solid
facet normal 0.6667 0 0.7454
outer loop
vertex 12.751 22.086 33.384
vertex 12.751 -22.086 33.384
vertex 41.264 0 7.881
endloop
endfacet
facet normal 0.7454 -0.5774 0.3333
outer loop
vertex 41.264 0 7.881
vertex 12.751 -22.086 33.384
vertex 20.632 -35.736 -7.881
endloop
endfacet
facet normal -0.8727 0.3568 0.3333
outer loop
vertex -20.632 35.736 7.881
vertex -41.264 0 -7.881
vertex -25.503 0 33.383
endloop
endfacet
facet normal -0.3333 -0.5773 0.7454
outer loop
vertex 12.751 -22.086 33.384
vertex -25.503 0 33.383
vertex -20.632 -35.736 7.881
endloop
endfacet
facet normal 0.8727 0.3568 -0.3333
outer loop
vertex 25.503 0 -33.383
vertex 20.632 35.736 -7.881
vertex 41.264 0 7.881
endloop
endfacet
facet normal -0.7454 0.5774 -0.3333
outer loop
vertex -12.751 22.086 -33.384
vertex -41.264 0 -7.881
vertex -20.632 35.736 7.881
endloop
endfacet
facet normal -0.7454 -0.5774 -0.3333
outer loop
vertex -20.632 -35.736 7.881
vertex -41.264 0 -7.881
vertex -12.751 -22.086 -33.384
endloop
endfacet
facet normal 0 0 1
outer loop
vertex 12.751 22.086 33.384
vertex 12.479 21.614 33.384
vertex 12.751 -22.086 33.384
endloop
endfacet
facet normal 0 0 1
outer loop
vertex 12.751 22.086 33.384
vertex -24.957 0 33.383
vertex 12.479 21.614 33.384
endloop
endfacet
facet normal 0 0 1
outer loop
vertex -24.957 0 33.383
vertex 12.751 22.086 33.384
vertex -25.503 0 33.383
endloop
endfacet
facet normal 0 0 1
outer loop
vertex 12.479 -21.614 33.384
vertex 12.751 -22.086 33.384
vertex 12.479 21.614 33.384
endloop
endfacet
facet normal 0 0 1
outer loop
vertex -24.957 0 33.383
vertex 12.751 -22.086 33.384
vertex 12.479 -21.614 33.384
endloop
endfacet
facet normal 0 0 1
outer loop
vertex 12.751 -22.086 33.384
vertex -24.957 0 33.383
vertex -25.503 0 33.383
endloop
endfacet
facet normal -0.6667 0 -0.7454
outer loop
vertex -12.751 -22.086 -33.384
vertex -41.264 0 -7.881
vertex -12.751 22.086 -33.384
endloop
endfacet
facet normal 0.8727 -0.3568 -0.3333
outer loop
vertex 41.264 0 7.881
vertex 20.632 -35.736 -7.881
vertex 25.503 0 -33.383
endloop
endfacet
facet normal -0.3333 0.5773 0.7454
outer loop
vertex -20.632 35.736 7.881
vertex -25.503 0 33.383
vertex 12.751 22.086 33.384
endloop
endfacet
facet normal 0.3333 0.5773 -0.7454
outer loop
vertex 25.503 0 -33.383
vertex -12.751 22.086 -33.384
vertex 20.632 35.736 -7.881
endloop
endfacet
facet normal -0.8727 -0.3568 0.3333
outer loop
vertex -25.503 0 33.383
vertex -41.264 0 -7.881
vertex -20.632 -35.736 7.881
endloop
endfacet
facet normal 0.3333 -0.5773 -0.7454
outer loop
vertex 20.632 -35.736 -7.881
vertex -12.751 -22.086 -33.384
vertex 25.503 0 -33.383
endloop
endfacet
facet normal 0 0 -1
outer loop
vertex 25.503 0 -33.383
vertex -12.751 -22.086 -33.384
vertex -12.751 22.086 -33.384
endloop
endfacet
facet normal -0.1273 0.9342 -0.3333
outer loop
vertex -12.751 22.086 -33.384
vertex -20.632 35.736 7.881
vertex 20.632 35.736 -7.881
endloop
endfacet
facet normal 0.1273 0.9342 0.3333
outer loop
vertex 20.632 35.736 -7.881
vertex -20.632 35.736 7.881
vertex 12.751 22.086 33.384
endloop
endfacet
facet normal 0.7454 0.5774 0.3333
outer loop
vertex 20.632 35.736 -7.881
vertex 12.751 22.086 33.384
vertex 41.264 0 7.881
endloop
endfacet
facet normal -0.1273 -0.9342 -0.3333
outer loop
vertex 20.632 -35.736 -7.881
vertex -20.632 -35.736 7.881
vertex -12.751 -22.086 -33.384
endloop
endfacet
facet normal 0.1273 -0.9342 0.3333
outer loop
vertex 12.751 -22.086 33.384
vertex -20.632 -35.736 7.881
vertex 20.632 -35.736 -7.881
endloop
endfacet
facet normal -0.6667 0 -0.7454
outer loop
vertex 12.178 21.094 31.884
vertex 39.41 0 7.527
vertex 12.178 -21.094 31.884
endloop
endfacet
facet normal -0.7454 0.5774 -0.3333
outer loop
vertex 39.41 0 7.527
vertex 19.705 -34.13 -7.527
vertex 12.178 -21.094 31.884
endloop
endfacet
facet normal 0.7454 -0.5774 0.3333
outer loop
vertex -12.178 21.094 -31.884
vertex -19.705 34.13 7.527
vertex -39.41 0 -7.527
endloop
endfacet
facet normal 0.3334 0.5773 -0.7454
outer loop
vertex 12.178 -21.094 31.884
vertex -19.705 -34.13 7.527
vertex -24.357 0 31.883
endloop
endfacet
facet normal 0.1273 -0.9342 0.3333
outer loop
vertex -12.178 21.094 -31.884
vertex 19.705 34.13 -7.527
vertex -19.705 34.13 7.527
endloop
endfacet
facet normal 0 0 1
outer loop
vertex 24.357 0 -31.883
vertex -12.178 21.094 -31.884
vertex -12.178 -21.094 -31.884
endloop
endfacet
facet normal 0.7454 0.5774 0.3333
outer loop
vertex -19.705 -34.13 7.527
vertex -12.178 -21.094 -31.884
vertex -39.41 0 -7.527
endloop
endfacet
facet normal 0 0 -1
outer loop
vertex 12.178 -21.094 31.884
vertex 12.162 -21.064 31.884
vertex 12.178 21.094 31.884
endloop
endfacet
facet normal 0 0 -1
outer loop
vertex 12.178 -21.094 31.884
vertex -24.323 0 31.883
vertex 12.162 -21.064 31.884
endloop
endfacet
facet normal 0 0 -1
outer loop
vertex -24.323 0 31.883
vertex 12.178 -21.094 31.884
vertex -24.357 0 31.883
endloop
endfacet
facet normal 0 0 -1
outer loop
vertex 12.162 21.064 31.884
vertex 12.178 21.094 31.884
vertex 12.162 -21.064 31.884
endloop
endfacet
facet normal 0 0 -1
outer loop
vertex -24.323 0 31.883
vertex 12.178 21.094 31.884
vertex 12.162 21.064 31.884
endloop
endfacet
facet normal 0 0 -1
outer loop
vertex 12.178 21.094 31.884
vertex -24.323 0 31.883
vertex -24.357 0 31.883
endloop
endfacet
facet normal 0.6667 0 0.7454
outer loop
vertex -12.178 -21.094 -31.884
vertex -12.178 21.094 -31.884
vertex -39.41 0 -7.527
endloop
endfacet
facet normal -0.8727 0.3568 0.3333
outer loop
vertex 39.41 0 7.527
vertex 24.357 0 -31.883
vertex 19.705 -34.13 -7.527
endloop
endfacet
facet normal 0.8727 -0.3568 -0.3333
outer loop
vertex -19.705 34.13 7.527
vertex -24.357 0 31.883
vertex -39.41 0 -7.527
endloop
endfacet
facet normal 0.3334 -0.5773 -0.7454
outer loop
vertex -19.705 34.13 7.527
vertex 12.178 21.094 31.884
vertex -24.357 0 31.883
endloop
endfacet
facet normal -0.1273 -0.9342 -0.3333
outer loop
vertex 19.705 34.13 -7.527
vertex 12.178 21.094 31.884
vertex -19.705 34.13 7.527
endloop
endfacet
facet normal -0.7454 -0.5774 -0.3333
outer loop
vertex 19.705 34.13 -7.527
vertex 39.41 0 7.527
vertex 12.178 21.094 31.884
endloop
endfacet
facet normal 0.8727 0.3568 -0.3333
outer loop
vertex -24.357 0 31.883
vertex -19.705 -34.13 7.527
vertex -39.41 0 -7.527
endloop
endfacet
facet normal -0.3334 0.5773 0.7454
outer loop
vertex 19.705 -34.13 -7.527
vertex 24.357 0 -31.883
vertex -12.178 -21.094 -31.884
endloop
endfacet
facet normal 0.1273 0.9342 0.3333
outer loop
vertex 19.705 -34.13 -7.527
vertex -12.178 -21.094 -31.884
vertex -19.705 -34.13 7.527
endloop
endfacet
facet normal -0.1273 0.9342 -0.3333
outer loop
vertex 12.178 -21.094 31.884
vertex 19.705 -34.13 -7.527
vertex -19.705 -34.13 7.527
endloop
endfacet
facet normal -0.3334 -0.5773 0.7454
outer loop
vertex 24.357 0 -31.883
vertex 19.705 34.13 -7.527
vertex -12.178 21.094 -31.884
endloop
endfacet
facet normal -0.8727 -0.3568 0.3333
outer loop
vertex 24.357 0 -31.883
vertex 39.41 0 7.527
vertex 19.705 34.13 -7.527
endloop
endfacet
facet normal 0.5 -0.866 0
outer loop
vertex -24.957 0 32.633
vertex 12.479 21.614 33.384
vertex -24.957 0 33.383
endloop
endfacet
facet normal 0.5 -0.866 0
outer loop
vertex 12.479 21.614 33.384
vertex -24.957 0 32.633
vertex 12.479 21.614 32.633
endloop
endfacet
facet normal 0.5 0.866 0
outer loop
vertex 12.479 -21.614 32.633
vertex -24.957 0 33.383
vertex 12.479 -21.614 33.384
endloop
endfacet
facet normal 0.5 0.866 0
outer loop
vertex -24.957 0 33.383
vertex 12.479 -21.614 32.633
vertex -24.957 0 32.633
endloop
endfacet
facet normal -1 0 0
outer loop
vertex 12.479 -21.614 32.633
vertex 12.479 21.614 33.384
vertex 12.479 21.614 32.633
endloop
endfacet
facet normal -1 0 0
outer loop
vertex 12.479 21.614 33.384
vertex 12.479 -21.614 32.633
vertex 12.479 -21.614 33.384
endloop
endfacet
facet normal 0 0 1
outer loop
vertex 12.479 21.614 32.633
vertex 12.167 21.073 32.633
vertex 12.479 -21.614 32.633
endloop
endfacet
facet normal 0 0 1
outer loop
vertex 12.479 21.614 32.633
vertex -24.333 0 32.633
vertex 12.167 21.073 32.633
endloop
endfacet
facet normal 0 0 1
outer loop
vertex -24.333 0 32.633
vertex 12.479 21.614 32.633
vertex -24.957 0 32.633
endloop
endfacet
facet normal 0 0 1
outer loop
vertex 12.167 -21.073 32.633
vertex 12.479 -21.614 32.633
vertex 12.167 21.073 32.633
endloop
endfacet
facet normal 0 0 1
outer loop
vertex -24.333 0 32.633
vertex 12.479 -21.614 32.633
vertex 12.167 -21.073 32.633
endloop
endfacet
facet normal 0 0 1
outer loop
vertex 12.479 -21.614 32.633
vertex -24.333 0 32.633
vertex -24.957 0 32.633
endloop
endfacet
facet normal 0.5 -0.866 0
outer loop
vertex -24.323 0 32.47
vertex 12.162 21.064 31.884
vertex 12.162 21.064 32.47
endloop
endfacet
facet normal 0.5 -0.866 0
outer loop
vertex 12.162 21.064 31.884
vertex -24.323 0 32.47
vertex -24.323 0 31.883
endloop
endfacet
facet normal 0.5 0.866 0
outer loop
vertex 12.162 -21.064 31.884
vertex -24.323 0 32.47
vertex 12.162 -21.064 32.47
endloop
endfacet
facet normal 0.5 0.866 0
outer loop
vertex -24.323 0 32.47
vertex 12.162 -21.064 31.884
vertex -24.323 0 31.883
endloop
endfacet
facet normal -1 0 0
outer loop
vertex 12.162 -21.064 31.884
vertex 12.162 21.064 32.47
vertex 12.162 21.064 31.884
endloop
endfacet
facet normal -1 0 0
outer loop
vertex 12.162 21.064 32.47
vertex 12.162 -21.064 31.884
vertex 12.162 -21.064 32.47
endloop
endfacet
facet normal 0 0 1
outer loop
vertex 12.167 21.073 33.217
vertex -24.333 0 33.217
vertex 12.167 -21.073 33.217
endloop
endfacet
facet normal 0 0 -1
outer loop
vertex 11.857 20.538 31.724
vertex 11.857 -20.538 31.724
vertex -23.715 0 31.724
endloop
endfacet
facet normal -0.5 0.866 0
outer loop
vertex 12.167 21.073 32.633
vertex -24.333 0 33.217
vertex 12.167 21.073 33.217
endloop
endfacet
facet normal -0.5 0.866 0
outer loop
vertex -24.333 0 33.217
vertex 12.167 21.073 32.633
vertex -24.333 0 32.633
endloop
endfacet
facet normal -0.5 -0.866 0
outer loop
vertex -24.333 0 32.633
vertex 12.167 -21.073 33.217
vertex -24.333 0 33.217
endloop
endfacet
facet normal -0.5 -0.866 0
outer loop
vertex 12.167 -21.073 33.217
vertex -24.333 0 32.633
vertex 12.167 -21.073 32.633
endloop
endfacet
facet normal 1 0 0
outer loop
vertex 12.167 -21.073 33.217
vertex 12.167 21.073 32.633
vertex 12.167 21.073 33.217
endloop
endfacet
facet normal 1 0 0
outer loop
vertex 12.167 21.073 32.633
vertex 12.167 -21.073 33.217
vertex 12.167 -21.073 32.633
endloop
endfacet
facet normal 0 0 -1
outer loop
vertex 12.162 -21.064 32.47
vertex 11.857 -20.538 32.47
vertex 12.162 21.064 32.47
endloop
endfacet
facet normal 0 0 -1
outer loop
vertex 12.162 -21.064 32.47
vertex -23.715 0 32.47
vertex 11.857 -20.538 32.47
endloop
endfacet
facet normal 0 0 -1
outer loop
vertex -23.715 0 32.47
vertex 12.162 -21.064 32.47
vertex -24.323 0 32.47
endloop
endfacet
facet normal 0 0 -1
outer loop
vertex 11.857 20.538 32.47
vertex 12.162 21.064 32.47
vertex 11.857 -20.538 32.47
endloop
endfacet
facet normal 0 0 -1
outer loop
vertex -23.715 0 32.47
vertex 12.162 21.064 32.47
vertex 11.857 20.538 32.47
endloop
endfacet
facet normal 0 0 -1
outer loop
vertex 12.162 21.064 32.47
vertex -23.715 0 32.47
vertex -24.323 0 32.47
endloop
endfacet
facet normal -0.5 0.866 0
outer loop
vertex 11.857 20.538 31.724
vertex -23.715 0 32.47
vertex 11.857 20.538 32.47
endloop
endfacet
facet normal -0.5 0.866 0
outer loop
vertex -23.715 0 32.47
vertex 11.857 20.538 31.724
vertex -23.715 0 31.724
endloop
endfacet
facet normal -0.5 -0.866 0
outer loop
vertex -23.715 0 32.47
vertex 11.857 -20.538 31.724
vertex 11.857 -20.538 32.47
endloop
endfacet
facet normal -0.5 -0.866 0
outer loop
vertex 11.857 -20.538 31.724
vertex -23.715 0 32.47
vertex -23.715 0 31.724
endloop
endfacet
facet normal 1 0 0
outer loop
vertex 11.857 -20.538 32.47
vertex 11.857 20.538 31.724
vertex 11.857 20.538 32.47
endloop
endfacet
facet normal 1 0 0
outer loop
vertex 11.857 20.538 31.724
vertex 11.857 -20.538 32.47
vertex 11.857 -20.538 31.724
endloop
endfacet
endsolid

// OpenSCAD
arete = 44.172;
angle = 20.905;
paroi = 1.5;
echelleReductionAjustementBouchon = 0.975;
r = 0.19; // résolution d'impression sur l'axe Z
ico_sch = [3,5];
Cpi = 3.14159;
Cphi = (1+sqrt(5))/2;
Cepsilon = 0.00000001;

function ico_ext_radius(a) = 
    a*1/4*(sqrt(10+2*sqrt(5)));
    
function ico_int_radius(a) = 
    a/12*(3*sqrt(3)+sqrt(15));
    
function ico_arete_from(int_radius) = 
    int_radius*12/(3*sqrt(3)+sqrt(15));
    
externalRadius = ico_ext_radius(arete);
internalRadius = ico_ext_radius( 
                    ico_arete_from(
                        ico_int_radius(arete)-paroi));
                        
echo(externalRadius); 
echo(internalRadius);

//ico_creux();
//decoupe_bouchon();
corps_ouvert();
bouchon();
//trou();

module corps_ouvert() {
    //rotate([180, 0, 0])
	difference() {
		ico_creux();
		decoupe_bouchon();
	}
}

module bouchon(version) {
//    rotate([180, 0, 0])
	scale([echelleReductionAjustementBouchon, echelleReductionAjustementBouchon, 0.995])
	difference () {
        intersection() {
            ico_creux();
            decoupe_bouchon(echelleReductionAjustementBouchon);
        }
        // trou centre face
//		translate([0, 0, externalRadius*0.5])
//		cylinder(30, r=diametreTrouBouchon/2, $fn=22);
	}
}

module trou() {
    rotate([0, -37.3, 0])
		translate([0, 0, externalRadius*0.5])
		cylinder(30, r=diametreTrouBouchon/2, $fn=22);
}

module ico_creux() {
	difference() {
        rotate([0, angle, 0]) icosahedron(externalRadius);
        rotate([0, angle, 0]) icosahedron(internalRadius);
	}
}

module decoupe_bouchon(scale=1) {
    distance = ico_int_radius(arete);
	rotate([0,0,60]) translate([0, 0, distance])
		cylinder(paroi, r=arete*0.565, $fn=3, center=true);
	rotate([0,0,60]) translate([0, 0, distance-paroi])
		cylinder(paroi, r=(arete-paroi)*0.57, $fn=3, center=true);
}

module icosahedron(rad=1) {
	Cphi = (1+sqrt(5))/2;

	// Convert spherical to cartesian
	function sph_to_cart(c, rad) = [
		rad*sin(atan2(sqrt(c[0]*c[0]+c[1]*c[1]), c[2]))*cos(atan2(c[1],c[0])),  
		rad*sin(atan2(sqrt(c[0]*c[0]+c[1]*c[1]), c[2]))*sin(atan2(c[1],c[0])),
		rad*cos(atan2(sqrt(c[0]*c[0]+c[1]*c[1]), c[2]))
		];


	//================================================
	//	Icosahedron
	//================================================
	//
	// (0, +-1, +-Cphi)
	// (+-Cphi, 0, +-1)
	// (+-1, +-Cphi, 0)

	function icosa_unit(rad) = [
		sph_to_cart([0, +1, +Cphi], rad), 
		sph_to_cart([0, +1, -Cphi], rad),
		sph_to_cart([0, -1, -Cphi], rad),
		sph_to_cart([0, -1, +Cphi], rad),
		sph_to_cart([+Cphi, 0, +1], rad), 
		sph_to_cart([+Cphi, 0, -1], rad), 
		sph_to_cart([-Cphi, 0, -1], rad),
		sph_to_cart([-Cphi, 0, +1], rad),
		sph_to_cart([+1, +Cphi, 0], rad),
		sph_to_cart([+1, -Cphi, 0], rad), 
		sph_to_cart([-1, -Cphi, 0], rad), 
		sph_to_cart([-1, +Cphi, 0], rad),
		];

	icosa_faces = [ 
		[3,0,4],
		[3,4,9],
		[3,9,10],
		[3,10,7],
		[3,7,0],
		[0,8,4],
		[0,7,11],
		[0,11,8],
		[4,8,5],
		[4,5,9],
		[7,10,6],
		[7,6,11],
		[9,5,2],
		[9,2,10],
		[2,6,10],
		[1,5,8],
		[1,8,11],
		[1,11,6],
		[5,1,2],
		[2,1,6]
		];

	polyhedron(icosa_unit(rad), faces = icosa_faces);
}
